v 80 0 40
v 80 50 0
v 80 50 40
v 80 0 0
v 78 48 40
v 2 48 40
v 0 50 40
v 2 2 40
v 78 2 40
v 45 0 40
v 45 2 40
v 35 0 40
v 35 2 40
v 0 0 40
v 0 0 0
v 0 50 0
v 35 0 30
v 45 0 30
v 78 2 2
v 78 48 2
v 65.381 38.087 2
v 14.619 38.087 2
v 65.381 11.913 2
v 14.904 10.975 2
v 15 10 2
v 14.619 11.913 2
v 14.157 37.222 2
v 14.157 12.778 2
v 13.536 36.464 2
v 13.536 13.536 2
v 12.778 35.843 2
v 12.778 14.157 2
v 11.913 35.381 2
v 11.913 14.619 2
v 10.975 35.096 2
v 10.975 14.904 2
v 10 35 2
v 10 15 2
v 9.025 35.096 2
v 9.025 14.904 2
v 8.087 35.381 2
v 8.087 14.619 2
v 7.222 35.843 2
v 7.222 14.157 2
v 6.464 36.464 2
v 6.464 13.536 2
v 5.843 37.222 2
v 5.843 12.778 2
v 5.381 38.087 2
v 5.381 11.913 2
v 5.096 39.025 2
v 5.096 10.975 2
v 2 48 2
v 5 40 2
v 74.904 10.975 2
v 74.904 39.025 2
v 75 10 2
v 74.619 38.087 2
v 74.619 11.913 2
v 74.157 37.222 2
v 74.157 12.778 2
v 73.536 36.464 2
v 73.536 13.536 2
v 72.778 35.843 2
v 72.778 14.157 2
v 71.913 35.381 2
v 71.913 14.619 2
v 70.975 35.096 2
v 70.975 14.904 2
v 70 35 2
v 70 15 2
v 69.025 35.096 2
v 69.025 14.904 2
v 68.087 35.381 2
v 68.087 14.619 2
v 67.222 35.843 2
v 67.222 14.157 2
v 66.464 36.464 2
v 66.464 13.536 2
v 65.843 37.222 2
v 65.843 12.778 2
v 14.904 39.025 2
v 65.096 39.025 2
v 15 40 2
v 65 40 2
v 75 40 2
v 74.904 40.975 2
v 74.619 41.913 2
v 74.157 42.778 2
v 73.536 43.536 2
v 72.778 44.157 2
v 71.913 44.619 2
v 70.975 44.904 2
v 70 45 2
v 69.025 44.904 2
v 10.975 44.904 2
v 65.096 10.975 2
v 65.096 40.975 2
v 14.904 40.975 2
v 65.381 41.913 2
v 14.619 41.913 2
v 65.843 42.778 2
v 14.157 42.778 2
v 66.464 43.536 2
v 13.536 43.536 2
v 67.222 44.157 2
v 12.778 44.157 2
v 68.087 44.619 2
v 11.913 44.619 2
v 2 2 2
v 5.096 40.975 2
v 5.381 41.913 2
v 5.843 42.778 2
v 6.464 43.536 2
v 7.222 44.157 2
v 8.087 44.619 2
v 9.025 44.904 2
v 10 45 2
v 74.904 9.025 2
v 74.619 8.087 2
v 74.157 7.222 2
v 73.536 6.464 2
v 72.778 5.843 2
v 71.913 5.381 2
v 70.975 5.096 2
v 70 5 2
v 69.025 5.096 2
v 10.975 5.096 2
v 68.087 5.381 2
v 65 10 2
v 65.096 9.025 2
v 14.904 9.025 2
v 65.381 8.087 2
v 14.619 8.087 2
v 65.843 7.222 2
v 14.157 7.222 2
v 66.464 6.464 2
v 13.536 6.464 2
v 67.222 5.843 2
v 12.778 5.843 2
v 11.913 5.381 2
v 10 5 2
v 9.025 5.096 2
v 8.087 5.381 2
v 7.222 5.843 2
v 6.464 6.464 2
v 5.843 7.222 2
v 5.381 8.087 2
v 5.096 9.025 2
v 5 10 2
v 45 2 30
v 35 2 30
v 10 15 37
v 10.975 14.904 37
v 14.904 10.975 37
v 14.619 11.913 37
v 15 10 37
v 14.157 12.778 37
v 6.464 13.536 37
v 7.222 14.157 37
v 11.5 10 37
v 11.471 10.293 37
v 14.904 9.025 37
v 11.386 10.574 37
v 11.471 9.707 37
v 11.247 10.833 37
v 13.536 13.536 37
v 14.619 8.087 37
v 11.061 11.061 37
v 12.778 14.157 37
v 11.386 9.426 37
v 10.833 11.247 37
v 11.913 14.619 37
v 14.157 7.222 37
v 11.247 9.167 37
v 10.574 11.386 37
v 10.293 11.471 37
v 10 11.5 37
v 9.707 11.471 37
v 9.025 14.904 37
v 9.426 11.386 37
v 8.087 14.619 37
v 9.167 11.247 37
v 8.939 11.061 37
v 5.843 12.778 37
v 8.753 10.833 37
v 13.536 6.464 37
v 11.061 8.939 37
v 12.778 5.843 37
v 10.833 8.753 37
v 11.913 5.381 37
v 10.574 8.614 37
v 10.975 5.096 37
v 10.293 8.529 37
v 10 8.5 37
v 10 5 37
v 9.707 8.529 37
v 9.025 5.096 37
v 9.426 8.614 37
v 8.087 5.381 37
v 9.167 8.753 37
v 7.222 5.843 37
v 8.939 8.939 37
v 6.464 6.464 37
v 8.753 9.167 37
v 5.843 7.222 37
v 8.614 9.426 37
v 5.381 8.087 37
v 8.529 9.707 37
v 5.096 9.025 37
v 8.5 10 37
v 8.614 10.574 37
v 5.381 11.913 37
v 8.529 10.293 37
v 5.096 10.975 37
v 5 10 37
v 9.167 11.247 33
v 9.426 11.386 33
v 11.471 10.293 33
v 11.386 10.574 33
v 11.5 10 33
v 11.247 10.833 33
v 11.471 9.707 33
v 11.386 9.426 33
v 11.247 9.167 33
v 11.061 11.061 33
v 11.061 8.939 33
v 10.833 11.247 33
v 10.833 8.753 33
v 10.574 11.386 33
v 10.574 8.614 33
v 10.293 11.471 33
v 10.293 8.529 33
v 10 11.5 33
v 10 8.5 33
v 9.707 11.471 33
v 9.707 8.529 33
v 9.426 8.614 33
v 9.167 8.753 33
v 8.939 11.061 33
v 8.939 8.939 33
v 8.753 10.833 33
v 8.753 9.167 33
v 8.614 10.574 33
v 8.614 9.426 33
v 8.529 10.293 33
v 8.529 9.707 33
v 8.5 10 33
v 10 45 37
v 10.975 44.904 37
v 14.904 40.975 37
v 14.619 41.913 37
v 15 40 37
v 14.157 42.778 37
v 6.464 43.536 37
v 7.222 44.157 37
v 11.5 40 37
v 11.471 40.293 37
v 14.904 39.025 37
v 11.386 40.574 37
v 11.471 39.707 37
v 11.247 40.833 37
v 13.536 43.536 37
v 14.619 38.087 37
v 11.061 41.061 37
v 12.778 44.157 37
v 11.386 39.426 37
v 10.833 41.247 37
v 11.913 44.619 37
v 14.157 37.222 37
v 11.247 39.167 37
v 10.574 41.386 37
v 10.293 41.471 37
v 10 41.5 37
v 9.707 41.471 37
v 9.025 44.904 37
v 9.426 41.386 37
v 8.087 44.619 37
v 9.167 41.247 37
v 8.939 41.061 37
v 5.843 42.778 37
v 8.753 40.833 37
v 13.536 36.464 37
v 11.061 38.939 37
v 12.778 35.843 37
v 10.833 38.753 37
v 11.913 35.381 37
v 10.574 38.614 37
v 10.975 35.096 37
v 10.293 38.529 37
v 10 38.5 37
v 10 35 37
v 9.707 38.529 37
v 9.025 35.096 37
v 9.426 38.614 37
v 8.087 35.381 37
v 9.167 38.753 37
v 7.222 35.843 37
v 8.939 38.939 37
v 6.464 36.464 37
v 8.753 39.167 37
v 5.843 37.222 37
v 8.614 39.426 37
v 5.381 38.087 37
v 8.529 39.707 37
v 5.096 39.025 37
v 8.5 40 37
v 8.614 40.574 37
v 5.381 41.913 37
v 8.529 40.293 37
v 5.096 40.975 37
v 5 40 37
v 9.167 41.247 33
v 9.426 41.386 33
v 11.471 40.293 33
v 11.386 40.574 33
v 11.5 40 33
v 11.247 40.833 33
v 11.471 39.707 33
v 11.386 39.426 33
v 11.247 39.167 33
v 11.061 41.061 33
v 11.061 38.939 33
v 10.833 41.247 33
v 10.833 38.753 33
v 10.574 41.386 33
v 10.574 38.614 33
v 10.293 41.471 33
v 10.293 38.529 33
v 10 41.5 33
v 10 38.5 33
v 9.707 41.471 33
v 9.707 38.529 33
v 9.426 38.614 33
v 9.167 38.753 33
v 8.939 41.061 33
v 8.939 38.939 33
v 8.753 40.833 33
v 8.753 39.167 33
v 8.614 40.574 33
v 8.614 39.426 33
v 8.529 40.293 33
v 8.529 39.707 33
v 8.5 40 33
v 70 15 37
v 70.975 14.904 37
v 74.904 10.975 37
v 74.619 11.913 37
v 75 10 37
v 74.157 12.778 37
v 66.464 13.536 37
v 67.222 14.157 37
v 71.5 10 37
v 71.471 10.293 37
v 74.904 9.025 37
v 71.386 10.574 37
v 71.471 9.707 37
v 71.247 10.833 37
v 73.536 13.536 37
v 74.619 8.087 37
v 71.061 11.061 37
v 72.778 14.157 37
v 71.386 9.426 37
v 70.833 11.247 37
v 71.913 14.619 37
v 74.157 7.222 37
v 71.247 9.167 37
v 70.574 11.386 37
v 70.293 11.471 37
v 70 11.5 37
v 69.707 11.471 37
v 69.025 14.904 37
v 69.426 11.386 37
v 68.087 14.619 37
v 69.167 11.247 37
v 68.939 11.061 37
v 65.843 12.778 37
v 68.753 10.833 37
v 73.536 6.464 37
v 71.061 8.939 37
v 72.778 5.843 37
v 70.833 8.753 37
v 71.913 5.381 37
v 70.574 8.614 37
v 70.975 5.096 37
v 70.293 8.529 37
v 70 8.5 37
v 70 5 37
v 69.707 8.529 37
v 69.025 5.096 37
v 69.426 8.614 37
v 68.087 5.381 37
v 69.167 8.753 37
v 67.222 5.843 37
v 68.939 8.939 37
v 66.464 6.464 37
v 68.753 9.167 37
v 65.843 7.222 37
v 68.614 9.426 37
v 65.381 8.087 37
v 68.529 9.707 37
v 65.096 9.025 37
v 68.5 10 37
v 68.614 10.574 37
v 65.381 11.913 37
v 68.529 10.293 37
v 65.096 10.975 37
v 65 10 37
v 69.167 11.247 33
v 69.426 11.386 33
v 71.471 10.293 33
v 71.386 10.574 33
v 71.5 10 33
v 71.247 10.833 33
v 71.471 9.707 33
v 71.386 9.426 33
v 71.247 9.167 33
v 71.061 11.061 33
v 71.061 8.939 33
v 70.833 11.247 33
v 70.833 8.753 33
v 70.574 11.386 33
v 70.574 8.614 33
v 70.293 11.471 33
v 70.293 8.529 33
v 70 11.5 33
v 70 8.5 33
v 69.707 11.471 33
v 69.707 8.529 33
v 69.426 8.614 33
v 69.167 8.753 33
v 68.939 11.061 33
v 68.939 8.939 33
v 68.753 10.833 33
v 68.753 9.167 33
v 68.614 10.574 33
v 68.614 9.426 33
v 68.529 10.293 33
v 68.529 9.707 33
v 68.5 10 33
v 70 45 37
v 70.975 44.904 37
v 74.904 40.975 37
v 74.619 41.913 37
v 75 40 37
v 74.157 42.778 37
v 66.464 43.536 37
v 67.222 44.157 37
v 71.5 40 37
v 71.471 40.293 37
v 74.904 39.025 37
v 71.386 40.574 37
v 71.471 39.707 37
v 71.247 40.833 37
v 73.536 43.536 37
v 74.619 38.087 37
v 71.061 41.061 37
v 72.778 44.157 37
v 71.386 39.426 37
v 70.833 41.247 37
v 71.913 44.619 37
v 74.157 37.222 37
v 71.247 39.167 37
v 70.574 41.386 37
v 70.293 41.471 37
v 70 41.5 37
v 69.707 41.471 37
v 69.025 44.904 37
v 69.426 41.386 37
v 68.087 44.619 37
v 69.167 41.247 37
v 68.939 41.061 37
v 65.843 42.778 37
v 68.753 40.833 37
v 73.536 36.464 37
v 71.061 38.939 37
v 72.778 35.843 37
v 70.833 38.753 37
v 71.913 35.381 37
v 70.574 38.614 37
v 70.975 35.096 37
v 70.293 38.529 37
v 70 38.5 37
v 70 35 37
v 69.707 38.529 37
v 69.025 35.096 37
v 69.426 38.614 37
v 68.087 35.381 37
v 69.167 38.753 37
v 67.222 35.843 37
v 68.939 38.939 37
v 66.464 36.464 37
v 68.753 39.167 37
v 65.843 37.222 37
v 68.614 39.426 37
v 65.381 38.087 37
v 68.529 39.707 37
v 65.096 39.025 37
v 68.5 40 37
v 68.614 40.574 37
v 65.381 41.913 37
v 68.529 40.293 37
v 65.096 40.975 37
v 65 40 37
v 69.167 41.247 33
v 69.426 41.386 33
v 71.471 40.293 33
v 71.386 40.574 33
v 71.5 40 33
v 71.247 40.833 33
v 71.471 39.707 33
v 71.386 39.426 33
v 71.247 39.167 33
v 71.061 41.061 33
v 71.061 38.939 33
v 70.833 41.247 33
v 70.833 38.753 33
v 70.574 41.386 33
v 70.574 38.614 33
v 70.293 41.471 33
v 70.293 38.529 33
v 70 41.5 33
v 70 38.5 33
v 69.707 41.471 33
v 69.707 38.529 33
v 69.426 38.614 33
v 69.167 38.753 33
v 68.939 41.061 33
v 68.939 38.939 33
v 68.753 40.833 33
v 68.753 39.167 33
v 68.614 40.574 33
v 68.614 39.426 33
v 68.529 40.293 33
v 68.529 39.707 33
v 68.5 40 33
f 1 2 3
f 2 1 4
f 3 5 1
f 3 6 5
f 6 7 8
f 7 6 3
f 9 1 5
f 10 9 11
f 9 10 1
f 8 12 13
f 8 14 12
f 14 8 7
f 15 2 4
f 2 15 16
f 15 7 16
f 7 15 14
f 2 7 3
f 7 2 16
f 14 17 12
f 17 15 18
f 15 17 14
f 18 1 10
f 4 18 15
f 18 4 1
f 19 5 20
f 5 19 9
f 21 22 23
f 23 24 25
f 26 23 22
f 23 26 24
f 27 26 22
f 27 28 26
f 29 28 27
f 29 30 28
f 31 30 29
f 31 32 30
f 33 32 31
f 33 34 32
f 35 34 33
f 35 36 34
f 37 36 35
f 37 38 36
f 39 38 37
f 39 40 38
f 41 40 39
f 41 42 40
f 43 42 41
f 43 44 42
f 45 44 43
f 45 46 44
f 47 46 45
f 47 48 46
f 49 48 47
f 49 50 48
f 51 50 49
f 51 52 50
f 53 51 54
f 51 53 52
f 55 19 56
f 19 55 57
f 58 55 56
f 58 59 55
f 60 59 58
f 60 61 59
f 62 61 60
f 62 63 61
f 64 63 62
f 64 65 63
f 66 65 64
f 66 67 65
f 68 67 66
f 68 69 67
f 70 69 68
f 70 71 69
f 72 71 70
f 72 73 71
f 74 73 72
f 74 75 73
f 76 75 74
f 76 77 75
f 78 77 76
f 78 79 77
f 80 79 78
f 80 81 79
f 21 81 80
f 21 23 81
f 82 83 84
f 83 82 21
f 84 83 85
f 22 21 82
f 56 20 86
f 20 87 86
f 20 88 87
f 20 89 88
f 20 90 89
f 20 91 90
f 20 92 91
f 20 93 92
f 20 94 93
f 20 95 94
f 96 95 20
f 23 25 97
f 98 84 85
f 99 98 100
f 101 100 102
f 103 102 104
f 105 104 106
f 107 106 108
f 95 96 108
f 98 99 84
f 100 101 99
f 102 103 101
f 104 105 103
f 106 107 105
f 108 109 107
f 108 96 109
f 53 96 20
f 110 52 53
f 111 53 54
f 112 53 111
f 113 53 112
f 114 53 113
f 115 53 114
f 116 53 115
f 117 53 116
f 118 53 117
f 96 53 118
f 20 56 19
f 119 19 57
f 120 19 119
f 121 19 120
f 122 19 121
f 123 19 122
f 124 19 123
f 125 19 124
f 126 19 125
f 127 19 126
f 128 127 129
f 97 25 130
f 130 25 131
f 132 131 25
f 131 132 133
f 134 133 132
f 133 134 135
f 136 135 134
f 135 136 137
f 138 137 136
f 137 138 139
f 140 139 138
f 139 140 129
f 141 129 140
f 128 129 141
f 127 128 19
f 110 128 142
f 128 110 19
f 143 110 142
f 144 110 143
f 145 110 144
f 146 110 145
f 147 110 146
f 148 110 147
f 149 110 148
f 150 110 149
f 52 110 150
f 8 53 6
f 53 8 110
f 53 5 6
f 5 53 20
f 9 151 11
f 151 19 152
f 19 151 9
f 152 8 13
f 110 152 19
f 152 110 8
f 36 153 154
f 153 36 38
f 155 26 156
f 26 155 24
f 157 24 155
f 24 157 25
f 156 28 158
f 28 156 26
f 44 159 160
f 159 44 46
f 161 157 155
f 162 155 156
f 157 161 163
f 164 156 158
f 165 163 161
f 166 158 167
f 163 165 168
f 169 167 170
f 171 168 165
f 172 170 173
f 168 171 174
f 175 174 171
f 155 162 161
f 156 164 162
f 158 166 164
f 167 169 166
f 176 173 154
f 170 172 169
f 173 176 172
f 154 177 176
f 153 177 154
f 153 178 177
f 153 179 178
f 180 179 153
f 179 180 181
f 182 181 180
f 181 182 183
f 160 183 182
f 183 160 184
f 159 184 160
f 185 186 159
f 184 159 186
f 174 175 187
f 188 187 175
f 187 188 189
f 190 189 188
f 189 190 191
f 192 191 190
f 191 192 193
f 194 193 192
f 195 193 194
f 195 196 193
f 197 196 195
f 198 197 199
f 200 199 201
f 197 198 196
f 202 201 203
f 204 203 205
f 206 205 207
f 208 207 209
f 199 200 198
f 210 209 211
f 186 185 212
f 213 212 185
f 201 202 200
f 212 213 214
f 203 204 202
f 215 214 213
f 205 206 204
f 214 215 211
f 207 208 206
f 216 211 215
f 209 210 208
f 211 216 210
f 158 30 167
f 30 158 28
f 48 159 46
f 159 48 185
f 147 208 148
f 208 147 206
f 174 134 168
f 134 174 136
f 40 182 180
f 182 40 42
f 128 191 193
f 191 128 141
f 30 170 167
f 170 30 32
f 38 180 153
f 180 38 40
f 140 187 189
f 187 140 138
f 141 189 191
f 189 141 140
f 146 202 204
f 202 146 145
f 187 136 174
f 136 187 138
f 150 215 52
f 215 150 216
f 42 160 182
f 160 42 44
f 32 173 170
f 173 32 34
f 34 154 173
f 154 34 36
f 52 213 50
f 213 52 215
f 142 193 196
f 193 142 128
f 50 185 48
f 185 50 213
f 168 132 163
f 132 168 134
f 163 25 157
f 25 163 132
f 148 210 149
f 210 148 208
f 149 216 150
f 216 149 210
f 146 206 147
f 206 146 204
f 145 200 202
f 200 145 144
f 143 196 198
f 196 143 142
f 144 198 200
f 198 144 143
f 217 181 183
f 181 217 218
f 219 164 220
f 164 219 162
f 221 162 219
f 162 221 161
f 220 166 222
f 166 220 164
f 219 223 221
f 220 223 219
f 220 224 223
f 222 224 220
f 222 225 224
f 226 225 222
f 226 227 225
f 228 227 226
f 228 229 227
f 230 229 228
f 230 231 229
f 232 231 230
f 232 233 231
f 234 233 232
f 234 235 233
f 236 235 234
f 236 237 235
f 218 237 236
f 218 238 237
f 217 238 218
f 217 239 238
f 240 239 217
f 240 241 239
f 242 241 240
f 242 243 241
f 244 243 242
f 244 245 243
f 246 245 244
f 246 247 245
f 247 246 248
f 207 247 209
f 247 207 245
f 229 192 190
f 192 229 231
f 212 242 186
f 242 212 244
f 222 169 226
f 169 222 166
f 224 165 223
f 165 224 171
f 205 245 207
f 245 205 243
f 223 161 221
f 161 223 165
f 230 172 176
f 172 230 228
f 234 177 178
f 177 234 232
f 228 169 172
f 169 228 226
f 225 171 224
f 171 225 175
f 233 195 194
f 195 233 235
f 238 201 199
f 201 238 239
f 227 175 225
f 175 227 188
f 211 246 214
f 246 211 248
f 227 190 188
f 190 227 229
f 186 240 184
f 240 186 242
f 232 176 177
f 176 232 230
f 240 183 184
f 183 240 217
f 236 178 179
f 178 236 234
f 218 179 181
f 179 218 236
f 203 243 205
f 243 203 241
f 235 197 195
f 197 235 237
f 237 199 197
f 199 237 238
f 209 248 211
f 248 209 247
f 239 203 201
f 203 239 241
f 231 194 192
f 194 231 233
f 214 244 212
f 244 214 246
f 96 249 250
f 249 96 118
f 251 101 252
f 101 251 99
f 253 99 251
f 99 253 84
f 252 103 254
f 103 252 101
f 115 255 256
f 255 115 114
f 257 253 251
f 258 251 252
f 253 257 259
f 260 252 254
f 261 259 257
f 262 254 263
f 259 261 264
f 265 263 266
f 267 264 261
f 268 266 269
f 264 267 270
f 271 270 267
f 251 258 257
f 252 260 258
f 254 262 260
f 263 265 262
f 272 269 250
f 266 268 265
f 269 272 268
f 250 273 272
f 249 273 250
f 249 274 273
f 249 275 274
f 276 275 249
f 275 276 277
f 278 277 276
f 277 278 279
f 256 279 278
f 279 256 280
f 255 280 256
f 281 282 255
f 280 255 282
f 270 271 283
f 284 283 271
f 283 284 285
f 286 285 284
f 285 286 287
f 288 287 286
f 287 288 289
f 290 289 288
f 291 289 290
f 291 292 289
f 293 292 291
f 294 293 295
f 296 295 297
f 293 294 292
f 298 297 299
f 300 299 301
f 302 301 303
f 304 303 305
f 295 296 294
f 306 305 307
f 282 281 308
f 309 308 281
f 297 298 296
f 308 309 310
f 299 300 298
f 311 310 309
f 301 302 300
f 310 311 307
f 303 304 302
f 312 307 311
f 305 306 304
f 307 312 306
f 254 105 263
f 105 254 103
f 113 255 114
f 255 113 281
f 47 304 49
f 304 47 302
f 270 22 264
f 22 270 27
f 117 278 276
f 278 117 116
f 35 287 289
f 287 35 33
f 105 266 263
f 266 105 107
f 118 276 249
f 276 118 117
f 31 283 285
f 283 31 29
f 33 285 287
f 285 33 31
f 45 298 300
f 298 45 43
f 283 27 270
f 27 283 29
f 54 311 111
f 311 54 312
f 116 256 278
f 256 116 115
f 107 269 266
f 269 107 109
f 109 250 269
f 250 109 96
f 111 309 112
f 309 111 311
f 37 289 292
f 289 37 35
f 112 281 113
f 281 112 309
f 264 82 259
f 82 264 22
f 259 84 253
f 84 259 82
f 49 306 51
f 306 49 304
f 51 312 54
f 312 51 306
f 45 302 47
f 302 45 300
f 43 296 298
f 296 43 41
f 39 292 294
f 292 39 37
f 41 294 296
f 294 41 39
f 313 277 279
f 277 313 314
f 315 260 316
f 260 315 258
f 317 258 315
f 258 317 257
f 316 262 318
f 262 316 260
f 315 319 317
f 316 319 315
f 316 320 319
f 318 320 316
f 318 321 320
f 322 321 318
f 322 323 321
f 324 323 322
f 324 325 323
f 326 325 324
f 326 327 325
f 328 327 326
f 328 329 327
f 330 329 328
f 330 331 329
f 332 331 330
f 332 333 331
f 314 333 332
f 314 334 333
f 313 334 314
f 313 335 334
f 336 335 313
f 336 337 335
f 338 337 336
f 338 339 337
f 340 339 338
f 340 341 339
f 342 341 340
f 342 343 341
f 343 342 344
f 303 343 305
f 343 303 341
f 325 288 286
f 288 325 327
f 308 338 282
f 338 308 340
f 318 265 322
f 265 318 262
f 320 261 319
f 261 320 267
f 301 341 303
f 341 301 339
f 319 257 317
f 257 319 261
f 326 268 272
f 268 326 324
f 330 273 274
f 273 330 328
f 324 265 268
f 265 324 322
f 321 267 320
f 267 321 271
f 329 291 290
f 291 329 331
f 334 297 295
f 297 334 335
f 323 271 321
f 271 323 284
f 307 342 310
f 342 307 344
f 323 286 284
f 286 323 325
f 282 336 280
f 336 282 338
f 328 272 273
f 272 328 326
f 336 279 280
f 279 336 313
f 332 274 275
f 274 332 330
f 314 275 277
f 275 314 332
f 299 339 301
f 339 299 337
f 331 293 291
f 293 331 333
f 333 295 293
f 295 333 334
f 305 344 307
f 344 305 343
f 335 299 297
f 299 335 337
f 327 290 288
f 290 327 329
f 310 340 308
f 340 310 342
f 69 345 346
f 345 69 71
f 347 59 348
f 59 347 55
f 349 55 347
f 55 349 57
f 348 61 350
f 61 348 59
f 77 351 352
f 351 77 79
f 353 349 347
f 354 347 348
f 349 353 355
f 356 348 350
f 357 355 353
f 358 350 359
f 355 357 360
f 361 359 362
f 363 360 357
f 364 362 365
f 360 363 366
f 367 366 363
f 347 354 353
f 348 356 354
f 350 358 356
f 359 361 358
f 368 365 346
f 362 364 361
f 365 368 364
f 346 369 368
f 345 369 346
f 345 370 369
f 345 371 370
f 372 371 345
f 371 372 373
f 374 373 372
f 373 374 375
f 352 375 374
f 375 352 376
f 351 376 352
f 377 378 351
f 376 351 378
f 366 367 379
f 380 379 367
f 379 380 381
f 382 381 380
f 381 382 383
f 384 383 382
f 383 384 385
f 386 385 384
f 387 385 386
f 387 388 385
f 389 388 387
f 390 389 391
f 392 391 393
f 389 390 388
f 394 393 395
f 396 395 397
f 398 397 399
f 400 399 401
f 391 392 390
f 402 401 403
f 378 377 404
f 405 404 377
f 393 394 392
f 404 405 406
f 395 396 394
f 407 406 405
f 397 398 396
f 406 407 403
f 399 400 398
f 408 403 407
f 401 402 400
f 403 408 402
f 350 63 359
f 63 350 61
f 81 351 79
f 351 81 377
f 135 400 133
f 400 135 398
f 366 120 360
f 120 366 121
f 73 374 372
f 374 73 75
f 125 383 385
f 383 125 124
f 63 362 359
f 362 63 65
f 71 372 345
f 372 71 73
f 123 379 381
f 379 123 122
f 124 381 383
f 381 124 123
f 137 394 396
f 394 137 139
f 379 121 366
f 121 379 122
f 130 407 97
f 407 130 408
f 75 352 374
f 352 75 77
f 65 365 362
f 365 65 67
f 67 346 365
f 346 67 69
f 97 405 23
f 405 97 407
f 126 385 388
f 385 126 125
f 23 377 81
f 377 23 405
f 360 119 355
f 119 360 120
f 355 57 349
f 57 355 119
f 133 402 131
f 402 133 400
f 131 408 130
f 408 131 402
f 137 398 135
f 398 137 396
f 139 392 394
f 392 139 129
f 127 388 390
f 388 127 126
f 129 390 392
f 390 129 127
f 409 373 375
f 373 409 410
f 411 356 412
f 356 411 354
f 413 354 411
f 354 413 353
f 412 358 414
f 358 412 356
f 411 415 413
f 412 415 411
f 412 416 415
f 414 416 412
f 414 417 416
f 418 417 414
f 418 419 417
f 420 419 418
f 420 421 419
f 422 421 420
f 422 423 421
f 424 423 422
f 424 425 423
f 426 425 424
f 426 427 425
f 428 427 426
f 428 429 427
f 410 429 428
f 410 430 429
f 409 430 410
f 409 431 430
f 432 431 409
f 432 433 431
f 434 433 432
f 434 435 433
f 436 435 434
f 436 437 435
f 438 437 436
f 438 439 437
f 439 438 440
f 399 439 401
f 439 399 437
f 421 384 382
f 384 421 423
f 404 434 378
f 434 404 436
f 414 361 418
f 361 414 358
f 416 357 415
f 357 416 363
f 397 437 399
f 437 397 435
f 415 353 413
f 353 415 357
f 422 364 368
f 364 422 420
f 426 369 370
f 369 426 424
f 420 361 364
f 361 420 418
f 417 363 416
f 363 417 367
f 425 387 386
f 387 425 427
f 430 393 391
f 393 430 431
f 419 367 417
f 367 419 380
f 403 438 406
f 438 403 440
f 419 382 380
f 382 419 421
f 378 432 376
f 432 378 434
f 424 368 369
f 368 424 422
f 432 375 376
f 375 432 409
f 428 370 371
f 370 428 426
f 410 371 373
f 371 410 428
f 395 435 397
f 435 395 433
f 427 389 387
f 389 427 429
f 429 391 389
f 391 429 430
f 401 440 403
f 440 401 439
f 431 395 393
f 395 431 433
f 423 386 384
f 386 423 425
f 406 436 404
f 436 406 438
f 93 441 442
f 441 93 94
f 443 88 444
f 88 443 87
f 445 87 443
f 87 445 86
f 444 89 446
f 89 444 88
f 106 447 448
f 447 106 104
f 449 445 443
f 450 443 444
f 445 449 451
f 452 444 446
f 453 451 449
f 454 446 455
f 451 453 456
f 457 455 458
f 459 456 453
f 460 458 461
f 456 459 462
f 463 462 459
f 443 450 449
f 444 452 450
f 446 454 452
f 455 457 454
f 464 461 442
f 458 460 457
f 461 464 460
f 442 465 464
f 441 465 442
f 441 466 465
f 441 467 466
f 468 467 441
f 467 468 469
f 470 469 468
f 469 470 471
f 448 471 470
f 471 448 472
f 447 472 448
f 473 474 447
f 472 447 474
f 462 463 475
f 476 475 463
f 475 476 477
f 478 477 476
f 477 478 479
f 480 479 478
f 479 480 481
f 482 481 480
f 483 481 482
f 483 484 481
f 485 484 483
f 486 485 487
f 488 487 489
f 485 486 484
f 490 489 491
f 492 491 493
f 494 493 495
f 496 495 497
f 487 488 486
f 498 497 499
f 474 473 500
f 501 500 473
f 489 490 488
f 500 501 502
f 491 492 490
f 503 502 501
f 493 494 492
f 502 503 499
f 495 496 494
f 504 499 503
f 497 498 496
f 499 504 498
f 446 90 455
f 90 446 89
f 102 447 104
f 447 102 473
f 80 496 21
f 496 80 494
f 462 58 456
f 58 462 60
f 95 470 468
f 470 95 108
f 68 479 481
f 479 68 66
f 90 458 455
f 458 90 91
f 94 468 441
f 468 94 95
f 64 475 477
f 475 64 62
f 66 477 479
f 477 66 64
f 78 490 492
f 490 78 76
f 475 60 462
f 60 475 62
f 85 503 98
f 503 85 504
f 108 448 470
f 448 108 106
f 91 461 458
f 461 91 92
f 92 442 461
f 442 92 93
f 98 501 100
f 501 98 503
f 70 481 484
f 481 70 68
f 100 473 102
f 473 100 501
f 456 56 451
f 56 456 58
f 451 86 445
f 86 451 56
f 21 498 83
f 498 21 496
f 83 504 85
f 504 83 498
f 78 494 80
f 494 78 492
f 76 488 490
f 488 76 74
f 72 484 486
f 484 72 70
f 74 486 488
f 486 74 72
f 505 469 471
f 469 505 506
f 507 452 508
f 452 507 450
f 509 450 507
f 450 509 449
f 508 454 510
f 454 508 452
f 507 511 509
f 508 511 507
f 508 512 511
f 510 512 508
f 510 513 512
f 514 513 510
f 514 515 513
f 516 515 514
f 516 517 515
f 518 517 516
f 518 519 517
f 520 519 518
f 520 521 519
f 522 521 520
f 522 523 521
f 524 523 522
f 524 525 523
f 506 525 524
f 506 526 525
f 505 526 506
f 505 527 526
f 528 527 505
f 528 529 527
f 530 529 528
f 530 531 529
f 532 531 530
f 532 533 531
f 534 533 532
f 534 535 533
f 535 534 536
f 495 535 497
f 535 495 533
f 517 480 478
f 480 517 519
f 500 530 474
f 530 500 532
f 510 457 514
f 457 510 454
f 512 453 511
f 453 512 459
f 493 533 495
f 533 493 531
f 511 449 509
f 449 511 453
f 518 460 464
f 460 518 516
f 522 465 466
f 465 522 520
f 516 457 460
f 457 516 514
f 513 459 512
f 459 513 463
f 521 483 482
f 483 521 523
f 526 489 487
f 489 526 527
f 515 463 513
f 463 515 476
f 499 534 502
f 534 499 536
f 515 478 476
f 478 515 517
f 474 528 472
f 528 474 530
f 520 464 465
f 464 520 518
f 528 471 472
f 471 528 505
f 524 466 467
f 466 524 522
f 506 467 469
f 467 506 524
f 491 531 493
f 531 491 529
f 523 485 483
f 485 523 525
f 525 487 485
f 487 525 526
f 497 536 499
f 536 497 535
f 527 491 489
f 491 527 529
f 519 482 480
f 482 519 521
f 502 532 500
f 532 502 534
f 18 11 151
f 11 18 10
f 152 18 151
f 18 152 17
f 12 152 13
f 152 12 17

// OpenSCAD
$fn = 32;

// ----------------------------------------------------------------------
// Enclosure box: both enclosure
// ----------------------------------------------------------------------

// --- parameters (mm) ---
box_l = 80;               // outer length, X
box_w = 50;               // outer width, Y
box_h = 40;               // outer height
wall_t = 2;               // wall thickness
boss_r = 5;               // corner boss radius
hole_r = 1.5;             // boss screw hole radius
boss_in = 10;             // boss inset from the corners
notch_w = 10;             // cable notch width
notch_h = 10;             // cable notch height

inner_h = box_h - wall_t;  // cavity depth
boss_h = inner_h - 2;  // corner boss height

difference() {
  union() {
    difference() {
      cube([box_l, box_w, box_h]);
      translate([wall_t, wall_t, wall_t])
        cube([box_l - 2 * wall_t, box_w - 2 * wall_t, box_h]);
    }
    for (sx = [0, 1], sy = [0, 1])
      translate([sx ? box_l - boss_in : boss_in,
                 sy ? box_w - boss_in : boss_in, wall_t - 1])
        difference() {
          cylinder(r = boss_r, h = boss_h);
          translate([0, 0, boss_h - 4])
            cylinder(r = hole_r, h = 5);
        }
  }
  translate([box_l / 2 - notch_w / 2, -1, box_h - notch_h])
    cube([notch_w, wall_t + 2, notch_h + 1]);
}
